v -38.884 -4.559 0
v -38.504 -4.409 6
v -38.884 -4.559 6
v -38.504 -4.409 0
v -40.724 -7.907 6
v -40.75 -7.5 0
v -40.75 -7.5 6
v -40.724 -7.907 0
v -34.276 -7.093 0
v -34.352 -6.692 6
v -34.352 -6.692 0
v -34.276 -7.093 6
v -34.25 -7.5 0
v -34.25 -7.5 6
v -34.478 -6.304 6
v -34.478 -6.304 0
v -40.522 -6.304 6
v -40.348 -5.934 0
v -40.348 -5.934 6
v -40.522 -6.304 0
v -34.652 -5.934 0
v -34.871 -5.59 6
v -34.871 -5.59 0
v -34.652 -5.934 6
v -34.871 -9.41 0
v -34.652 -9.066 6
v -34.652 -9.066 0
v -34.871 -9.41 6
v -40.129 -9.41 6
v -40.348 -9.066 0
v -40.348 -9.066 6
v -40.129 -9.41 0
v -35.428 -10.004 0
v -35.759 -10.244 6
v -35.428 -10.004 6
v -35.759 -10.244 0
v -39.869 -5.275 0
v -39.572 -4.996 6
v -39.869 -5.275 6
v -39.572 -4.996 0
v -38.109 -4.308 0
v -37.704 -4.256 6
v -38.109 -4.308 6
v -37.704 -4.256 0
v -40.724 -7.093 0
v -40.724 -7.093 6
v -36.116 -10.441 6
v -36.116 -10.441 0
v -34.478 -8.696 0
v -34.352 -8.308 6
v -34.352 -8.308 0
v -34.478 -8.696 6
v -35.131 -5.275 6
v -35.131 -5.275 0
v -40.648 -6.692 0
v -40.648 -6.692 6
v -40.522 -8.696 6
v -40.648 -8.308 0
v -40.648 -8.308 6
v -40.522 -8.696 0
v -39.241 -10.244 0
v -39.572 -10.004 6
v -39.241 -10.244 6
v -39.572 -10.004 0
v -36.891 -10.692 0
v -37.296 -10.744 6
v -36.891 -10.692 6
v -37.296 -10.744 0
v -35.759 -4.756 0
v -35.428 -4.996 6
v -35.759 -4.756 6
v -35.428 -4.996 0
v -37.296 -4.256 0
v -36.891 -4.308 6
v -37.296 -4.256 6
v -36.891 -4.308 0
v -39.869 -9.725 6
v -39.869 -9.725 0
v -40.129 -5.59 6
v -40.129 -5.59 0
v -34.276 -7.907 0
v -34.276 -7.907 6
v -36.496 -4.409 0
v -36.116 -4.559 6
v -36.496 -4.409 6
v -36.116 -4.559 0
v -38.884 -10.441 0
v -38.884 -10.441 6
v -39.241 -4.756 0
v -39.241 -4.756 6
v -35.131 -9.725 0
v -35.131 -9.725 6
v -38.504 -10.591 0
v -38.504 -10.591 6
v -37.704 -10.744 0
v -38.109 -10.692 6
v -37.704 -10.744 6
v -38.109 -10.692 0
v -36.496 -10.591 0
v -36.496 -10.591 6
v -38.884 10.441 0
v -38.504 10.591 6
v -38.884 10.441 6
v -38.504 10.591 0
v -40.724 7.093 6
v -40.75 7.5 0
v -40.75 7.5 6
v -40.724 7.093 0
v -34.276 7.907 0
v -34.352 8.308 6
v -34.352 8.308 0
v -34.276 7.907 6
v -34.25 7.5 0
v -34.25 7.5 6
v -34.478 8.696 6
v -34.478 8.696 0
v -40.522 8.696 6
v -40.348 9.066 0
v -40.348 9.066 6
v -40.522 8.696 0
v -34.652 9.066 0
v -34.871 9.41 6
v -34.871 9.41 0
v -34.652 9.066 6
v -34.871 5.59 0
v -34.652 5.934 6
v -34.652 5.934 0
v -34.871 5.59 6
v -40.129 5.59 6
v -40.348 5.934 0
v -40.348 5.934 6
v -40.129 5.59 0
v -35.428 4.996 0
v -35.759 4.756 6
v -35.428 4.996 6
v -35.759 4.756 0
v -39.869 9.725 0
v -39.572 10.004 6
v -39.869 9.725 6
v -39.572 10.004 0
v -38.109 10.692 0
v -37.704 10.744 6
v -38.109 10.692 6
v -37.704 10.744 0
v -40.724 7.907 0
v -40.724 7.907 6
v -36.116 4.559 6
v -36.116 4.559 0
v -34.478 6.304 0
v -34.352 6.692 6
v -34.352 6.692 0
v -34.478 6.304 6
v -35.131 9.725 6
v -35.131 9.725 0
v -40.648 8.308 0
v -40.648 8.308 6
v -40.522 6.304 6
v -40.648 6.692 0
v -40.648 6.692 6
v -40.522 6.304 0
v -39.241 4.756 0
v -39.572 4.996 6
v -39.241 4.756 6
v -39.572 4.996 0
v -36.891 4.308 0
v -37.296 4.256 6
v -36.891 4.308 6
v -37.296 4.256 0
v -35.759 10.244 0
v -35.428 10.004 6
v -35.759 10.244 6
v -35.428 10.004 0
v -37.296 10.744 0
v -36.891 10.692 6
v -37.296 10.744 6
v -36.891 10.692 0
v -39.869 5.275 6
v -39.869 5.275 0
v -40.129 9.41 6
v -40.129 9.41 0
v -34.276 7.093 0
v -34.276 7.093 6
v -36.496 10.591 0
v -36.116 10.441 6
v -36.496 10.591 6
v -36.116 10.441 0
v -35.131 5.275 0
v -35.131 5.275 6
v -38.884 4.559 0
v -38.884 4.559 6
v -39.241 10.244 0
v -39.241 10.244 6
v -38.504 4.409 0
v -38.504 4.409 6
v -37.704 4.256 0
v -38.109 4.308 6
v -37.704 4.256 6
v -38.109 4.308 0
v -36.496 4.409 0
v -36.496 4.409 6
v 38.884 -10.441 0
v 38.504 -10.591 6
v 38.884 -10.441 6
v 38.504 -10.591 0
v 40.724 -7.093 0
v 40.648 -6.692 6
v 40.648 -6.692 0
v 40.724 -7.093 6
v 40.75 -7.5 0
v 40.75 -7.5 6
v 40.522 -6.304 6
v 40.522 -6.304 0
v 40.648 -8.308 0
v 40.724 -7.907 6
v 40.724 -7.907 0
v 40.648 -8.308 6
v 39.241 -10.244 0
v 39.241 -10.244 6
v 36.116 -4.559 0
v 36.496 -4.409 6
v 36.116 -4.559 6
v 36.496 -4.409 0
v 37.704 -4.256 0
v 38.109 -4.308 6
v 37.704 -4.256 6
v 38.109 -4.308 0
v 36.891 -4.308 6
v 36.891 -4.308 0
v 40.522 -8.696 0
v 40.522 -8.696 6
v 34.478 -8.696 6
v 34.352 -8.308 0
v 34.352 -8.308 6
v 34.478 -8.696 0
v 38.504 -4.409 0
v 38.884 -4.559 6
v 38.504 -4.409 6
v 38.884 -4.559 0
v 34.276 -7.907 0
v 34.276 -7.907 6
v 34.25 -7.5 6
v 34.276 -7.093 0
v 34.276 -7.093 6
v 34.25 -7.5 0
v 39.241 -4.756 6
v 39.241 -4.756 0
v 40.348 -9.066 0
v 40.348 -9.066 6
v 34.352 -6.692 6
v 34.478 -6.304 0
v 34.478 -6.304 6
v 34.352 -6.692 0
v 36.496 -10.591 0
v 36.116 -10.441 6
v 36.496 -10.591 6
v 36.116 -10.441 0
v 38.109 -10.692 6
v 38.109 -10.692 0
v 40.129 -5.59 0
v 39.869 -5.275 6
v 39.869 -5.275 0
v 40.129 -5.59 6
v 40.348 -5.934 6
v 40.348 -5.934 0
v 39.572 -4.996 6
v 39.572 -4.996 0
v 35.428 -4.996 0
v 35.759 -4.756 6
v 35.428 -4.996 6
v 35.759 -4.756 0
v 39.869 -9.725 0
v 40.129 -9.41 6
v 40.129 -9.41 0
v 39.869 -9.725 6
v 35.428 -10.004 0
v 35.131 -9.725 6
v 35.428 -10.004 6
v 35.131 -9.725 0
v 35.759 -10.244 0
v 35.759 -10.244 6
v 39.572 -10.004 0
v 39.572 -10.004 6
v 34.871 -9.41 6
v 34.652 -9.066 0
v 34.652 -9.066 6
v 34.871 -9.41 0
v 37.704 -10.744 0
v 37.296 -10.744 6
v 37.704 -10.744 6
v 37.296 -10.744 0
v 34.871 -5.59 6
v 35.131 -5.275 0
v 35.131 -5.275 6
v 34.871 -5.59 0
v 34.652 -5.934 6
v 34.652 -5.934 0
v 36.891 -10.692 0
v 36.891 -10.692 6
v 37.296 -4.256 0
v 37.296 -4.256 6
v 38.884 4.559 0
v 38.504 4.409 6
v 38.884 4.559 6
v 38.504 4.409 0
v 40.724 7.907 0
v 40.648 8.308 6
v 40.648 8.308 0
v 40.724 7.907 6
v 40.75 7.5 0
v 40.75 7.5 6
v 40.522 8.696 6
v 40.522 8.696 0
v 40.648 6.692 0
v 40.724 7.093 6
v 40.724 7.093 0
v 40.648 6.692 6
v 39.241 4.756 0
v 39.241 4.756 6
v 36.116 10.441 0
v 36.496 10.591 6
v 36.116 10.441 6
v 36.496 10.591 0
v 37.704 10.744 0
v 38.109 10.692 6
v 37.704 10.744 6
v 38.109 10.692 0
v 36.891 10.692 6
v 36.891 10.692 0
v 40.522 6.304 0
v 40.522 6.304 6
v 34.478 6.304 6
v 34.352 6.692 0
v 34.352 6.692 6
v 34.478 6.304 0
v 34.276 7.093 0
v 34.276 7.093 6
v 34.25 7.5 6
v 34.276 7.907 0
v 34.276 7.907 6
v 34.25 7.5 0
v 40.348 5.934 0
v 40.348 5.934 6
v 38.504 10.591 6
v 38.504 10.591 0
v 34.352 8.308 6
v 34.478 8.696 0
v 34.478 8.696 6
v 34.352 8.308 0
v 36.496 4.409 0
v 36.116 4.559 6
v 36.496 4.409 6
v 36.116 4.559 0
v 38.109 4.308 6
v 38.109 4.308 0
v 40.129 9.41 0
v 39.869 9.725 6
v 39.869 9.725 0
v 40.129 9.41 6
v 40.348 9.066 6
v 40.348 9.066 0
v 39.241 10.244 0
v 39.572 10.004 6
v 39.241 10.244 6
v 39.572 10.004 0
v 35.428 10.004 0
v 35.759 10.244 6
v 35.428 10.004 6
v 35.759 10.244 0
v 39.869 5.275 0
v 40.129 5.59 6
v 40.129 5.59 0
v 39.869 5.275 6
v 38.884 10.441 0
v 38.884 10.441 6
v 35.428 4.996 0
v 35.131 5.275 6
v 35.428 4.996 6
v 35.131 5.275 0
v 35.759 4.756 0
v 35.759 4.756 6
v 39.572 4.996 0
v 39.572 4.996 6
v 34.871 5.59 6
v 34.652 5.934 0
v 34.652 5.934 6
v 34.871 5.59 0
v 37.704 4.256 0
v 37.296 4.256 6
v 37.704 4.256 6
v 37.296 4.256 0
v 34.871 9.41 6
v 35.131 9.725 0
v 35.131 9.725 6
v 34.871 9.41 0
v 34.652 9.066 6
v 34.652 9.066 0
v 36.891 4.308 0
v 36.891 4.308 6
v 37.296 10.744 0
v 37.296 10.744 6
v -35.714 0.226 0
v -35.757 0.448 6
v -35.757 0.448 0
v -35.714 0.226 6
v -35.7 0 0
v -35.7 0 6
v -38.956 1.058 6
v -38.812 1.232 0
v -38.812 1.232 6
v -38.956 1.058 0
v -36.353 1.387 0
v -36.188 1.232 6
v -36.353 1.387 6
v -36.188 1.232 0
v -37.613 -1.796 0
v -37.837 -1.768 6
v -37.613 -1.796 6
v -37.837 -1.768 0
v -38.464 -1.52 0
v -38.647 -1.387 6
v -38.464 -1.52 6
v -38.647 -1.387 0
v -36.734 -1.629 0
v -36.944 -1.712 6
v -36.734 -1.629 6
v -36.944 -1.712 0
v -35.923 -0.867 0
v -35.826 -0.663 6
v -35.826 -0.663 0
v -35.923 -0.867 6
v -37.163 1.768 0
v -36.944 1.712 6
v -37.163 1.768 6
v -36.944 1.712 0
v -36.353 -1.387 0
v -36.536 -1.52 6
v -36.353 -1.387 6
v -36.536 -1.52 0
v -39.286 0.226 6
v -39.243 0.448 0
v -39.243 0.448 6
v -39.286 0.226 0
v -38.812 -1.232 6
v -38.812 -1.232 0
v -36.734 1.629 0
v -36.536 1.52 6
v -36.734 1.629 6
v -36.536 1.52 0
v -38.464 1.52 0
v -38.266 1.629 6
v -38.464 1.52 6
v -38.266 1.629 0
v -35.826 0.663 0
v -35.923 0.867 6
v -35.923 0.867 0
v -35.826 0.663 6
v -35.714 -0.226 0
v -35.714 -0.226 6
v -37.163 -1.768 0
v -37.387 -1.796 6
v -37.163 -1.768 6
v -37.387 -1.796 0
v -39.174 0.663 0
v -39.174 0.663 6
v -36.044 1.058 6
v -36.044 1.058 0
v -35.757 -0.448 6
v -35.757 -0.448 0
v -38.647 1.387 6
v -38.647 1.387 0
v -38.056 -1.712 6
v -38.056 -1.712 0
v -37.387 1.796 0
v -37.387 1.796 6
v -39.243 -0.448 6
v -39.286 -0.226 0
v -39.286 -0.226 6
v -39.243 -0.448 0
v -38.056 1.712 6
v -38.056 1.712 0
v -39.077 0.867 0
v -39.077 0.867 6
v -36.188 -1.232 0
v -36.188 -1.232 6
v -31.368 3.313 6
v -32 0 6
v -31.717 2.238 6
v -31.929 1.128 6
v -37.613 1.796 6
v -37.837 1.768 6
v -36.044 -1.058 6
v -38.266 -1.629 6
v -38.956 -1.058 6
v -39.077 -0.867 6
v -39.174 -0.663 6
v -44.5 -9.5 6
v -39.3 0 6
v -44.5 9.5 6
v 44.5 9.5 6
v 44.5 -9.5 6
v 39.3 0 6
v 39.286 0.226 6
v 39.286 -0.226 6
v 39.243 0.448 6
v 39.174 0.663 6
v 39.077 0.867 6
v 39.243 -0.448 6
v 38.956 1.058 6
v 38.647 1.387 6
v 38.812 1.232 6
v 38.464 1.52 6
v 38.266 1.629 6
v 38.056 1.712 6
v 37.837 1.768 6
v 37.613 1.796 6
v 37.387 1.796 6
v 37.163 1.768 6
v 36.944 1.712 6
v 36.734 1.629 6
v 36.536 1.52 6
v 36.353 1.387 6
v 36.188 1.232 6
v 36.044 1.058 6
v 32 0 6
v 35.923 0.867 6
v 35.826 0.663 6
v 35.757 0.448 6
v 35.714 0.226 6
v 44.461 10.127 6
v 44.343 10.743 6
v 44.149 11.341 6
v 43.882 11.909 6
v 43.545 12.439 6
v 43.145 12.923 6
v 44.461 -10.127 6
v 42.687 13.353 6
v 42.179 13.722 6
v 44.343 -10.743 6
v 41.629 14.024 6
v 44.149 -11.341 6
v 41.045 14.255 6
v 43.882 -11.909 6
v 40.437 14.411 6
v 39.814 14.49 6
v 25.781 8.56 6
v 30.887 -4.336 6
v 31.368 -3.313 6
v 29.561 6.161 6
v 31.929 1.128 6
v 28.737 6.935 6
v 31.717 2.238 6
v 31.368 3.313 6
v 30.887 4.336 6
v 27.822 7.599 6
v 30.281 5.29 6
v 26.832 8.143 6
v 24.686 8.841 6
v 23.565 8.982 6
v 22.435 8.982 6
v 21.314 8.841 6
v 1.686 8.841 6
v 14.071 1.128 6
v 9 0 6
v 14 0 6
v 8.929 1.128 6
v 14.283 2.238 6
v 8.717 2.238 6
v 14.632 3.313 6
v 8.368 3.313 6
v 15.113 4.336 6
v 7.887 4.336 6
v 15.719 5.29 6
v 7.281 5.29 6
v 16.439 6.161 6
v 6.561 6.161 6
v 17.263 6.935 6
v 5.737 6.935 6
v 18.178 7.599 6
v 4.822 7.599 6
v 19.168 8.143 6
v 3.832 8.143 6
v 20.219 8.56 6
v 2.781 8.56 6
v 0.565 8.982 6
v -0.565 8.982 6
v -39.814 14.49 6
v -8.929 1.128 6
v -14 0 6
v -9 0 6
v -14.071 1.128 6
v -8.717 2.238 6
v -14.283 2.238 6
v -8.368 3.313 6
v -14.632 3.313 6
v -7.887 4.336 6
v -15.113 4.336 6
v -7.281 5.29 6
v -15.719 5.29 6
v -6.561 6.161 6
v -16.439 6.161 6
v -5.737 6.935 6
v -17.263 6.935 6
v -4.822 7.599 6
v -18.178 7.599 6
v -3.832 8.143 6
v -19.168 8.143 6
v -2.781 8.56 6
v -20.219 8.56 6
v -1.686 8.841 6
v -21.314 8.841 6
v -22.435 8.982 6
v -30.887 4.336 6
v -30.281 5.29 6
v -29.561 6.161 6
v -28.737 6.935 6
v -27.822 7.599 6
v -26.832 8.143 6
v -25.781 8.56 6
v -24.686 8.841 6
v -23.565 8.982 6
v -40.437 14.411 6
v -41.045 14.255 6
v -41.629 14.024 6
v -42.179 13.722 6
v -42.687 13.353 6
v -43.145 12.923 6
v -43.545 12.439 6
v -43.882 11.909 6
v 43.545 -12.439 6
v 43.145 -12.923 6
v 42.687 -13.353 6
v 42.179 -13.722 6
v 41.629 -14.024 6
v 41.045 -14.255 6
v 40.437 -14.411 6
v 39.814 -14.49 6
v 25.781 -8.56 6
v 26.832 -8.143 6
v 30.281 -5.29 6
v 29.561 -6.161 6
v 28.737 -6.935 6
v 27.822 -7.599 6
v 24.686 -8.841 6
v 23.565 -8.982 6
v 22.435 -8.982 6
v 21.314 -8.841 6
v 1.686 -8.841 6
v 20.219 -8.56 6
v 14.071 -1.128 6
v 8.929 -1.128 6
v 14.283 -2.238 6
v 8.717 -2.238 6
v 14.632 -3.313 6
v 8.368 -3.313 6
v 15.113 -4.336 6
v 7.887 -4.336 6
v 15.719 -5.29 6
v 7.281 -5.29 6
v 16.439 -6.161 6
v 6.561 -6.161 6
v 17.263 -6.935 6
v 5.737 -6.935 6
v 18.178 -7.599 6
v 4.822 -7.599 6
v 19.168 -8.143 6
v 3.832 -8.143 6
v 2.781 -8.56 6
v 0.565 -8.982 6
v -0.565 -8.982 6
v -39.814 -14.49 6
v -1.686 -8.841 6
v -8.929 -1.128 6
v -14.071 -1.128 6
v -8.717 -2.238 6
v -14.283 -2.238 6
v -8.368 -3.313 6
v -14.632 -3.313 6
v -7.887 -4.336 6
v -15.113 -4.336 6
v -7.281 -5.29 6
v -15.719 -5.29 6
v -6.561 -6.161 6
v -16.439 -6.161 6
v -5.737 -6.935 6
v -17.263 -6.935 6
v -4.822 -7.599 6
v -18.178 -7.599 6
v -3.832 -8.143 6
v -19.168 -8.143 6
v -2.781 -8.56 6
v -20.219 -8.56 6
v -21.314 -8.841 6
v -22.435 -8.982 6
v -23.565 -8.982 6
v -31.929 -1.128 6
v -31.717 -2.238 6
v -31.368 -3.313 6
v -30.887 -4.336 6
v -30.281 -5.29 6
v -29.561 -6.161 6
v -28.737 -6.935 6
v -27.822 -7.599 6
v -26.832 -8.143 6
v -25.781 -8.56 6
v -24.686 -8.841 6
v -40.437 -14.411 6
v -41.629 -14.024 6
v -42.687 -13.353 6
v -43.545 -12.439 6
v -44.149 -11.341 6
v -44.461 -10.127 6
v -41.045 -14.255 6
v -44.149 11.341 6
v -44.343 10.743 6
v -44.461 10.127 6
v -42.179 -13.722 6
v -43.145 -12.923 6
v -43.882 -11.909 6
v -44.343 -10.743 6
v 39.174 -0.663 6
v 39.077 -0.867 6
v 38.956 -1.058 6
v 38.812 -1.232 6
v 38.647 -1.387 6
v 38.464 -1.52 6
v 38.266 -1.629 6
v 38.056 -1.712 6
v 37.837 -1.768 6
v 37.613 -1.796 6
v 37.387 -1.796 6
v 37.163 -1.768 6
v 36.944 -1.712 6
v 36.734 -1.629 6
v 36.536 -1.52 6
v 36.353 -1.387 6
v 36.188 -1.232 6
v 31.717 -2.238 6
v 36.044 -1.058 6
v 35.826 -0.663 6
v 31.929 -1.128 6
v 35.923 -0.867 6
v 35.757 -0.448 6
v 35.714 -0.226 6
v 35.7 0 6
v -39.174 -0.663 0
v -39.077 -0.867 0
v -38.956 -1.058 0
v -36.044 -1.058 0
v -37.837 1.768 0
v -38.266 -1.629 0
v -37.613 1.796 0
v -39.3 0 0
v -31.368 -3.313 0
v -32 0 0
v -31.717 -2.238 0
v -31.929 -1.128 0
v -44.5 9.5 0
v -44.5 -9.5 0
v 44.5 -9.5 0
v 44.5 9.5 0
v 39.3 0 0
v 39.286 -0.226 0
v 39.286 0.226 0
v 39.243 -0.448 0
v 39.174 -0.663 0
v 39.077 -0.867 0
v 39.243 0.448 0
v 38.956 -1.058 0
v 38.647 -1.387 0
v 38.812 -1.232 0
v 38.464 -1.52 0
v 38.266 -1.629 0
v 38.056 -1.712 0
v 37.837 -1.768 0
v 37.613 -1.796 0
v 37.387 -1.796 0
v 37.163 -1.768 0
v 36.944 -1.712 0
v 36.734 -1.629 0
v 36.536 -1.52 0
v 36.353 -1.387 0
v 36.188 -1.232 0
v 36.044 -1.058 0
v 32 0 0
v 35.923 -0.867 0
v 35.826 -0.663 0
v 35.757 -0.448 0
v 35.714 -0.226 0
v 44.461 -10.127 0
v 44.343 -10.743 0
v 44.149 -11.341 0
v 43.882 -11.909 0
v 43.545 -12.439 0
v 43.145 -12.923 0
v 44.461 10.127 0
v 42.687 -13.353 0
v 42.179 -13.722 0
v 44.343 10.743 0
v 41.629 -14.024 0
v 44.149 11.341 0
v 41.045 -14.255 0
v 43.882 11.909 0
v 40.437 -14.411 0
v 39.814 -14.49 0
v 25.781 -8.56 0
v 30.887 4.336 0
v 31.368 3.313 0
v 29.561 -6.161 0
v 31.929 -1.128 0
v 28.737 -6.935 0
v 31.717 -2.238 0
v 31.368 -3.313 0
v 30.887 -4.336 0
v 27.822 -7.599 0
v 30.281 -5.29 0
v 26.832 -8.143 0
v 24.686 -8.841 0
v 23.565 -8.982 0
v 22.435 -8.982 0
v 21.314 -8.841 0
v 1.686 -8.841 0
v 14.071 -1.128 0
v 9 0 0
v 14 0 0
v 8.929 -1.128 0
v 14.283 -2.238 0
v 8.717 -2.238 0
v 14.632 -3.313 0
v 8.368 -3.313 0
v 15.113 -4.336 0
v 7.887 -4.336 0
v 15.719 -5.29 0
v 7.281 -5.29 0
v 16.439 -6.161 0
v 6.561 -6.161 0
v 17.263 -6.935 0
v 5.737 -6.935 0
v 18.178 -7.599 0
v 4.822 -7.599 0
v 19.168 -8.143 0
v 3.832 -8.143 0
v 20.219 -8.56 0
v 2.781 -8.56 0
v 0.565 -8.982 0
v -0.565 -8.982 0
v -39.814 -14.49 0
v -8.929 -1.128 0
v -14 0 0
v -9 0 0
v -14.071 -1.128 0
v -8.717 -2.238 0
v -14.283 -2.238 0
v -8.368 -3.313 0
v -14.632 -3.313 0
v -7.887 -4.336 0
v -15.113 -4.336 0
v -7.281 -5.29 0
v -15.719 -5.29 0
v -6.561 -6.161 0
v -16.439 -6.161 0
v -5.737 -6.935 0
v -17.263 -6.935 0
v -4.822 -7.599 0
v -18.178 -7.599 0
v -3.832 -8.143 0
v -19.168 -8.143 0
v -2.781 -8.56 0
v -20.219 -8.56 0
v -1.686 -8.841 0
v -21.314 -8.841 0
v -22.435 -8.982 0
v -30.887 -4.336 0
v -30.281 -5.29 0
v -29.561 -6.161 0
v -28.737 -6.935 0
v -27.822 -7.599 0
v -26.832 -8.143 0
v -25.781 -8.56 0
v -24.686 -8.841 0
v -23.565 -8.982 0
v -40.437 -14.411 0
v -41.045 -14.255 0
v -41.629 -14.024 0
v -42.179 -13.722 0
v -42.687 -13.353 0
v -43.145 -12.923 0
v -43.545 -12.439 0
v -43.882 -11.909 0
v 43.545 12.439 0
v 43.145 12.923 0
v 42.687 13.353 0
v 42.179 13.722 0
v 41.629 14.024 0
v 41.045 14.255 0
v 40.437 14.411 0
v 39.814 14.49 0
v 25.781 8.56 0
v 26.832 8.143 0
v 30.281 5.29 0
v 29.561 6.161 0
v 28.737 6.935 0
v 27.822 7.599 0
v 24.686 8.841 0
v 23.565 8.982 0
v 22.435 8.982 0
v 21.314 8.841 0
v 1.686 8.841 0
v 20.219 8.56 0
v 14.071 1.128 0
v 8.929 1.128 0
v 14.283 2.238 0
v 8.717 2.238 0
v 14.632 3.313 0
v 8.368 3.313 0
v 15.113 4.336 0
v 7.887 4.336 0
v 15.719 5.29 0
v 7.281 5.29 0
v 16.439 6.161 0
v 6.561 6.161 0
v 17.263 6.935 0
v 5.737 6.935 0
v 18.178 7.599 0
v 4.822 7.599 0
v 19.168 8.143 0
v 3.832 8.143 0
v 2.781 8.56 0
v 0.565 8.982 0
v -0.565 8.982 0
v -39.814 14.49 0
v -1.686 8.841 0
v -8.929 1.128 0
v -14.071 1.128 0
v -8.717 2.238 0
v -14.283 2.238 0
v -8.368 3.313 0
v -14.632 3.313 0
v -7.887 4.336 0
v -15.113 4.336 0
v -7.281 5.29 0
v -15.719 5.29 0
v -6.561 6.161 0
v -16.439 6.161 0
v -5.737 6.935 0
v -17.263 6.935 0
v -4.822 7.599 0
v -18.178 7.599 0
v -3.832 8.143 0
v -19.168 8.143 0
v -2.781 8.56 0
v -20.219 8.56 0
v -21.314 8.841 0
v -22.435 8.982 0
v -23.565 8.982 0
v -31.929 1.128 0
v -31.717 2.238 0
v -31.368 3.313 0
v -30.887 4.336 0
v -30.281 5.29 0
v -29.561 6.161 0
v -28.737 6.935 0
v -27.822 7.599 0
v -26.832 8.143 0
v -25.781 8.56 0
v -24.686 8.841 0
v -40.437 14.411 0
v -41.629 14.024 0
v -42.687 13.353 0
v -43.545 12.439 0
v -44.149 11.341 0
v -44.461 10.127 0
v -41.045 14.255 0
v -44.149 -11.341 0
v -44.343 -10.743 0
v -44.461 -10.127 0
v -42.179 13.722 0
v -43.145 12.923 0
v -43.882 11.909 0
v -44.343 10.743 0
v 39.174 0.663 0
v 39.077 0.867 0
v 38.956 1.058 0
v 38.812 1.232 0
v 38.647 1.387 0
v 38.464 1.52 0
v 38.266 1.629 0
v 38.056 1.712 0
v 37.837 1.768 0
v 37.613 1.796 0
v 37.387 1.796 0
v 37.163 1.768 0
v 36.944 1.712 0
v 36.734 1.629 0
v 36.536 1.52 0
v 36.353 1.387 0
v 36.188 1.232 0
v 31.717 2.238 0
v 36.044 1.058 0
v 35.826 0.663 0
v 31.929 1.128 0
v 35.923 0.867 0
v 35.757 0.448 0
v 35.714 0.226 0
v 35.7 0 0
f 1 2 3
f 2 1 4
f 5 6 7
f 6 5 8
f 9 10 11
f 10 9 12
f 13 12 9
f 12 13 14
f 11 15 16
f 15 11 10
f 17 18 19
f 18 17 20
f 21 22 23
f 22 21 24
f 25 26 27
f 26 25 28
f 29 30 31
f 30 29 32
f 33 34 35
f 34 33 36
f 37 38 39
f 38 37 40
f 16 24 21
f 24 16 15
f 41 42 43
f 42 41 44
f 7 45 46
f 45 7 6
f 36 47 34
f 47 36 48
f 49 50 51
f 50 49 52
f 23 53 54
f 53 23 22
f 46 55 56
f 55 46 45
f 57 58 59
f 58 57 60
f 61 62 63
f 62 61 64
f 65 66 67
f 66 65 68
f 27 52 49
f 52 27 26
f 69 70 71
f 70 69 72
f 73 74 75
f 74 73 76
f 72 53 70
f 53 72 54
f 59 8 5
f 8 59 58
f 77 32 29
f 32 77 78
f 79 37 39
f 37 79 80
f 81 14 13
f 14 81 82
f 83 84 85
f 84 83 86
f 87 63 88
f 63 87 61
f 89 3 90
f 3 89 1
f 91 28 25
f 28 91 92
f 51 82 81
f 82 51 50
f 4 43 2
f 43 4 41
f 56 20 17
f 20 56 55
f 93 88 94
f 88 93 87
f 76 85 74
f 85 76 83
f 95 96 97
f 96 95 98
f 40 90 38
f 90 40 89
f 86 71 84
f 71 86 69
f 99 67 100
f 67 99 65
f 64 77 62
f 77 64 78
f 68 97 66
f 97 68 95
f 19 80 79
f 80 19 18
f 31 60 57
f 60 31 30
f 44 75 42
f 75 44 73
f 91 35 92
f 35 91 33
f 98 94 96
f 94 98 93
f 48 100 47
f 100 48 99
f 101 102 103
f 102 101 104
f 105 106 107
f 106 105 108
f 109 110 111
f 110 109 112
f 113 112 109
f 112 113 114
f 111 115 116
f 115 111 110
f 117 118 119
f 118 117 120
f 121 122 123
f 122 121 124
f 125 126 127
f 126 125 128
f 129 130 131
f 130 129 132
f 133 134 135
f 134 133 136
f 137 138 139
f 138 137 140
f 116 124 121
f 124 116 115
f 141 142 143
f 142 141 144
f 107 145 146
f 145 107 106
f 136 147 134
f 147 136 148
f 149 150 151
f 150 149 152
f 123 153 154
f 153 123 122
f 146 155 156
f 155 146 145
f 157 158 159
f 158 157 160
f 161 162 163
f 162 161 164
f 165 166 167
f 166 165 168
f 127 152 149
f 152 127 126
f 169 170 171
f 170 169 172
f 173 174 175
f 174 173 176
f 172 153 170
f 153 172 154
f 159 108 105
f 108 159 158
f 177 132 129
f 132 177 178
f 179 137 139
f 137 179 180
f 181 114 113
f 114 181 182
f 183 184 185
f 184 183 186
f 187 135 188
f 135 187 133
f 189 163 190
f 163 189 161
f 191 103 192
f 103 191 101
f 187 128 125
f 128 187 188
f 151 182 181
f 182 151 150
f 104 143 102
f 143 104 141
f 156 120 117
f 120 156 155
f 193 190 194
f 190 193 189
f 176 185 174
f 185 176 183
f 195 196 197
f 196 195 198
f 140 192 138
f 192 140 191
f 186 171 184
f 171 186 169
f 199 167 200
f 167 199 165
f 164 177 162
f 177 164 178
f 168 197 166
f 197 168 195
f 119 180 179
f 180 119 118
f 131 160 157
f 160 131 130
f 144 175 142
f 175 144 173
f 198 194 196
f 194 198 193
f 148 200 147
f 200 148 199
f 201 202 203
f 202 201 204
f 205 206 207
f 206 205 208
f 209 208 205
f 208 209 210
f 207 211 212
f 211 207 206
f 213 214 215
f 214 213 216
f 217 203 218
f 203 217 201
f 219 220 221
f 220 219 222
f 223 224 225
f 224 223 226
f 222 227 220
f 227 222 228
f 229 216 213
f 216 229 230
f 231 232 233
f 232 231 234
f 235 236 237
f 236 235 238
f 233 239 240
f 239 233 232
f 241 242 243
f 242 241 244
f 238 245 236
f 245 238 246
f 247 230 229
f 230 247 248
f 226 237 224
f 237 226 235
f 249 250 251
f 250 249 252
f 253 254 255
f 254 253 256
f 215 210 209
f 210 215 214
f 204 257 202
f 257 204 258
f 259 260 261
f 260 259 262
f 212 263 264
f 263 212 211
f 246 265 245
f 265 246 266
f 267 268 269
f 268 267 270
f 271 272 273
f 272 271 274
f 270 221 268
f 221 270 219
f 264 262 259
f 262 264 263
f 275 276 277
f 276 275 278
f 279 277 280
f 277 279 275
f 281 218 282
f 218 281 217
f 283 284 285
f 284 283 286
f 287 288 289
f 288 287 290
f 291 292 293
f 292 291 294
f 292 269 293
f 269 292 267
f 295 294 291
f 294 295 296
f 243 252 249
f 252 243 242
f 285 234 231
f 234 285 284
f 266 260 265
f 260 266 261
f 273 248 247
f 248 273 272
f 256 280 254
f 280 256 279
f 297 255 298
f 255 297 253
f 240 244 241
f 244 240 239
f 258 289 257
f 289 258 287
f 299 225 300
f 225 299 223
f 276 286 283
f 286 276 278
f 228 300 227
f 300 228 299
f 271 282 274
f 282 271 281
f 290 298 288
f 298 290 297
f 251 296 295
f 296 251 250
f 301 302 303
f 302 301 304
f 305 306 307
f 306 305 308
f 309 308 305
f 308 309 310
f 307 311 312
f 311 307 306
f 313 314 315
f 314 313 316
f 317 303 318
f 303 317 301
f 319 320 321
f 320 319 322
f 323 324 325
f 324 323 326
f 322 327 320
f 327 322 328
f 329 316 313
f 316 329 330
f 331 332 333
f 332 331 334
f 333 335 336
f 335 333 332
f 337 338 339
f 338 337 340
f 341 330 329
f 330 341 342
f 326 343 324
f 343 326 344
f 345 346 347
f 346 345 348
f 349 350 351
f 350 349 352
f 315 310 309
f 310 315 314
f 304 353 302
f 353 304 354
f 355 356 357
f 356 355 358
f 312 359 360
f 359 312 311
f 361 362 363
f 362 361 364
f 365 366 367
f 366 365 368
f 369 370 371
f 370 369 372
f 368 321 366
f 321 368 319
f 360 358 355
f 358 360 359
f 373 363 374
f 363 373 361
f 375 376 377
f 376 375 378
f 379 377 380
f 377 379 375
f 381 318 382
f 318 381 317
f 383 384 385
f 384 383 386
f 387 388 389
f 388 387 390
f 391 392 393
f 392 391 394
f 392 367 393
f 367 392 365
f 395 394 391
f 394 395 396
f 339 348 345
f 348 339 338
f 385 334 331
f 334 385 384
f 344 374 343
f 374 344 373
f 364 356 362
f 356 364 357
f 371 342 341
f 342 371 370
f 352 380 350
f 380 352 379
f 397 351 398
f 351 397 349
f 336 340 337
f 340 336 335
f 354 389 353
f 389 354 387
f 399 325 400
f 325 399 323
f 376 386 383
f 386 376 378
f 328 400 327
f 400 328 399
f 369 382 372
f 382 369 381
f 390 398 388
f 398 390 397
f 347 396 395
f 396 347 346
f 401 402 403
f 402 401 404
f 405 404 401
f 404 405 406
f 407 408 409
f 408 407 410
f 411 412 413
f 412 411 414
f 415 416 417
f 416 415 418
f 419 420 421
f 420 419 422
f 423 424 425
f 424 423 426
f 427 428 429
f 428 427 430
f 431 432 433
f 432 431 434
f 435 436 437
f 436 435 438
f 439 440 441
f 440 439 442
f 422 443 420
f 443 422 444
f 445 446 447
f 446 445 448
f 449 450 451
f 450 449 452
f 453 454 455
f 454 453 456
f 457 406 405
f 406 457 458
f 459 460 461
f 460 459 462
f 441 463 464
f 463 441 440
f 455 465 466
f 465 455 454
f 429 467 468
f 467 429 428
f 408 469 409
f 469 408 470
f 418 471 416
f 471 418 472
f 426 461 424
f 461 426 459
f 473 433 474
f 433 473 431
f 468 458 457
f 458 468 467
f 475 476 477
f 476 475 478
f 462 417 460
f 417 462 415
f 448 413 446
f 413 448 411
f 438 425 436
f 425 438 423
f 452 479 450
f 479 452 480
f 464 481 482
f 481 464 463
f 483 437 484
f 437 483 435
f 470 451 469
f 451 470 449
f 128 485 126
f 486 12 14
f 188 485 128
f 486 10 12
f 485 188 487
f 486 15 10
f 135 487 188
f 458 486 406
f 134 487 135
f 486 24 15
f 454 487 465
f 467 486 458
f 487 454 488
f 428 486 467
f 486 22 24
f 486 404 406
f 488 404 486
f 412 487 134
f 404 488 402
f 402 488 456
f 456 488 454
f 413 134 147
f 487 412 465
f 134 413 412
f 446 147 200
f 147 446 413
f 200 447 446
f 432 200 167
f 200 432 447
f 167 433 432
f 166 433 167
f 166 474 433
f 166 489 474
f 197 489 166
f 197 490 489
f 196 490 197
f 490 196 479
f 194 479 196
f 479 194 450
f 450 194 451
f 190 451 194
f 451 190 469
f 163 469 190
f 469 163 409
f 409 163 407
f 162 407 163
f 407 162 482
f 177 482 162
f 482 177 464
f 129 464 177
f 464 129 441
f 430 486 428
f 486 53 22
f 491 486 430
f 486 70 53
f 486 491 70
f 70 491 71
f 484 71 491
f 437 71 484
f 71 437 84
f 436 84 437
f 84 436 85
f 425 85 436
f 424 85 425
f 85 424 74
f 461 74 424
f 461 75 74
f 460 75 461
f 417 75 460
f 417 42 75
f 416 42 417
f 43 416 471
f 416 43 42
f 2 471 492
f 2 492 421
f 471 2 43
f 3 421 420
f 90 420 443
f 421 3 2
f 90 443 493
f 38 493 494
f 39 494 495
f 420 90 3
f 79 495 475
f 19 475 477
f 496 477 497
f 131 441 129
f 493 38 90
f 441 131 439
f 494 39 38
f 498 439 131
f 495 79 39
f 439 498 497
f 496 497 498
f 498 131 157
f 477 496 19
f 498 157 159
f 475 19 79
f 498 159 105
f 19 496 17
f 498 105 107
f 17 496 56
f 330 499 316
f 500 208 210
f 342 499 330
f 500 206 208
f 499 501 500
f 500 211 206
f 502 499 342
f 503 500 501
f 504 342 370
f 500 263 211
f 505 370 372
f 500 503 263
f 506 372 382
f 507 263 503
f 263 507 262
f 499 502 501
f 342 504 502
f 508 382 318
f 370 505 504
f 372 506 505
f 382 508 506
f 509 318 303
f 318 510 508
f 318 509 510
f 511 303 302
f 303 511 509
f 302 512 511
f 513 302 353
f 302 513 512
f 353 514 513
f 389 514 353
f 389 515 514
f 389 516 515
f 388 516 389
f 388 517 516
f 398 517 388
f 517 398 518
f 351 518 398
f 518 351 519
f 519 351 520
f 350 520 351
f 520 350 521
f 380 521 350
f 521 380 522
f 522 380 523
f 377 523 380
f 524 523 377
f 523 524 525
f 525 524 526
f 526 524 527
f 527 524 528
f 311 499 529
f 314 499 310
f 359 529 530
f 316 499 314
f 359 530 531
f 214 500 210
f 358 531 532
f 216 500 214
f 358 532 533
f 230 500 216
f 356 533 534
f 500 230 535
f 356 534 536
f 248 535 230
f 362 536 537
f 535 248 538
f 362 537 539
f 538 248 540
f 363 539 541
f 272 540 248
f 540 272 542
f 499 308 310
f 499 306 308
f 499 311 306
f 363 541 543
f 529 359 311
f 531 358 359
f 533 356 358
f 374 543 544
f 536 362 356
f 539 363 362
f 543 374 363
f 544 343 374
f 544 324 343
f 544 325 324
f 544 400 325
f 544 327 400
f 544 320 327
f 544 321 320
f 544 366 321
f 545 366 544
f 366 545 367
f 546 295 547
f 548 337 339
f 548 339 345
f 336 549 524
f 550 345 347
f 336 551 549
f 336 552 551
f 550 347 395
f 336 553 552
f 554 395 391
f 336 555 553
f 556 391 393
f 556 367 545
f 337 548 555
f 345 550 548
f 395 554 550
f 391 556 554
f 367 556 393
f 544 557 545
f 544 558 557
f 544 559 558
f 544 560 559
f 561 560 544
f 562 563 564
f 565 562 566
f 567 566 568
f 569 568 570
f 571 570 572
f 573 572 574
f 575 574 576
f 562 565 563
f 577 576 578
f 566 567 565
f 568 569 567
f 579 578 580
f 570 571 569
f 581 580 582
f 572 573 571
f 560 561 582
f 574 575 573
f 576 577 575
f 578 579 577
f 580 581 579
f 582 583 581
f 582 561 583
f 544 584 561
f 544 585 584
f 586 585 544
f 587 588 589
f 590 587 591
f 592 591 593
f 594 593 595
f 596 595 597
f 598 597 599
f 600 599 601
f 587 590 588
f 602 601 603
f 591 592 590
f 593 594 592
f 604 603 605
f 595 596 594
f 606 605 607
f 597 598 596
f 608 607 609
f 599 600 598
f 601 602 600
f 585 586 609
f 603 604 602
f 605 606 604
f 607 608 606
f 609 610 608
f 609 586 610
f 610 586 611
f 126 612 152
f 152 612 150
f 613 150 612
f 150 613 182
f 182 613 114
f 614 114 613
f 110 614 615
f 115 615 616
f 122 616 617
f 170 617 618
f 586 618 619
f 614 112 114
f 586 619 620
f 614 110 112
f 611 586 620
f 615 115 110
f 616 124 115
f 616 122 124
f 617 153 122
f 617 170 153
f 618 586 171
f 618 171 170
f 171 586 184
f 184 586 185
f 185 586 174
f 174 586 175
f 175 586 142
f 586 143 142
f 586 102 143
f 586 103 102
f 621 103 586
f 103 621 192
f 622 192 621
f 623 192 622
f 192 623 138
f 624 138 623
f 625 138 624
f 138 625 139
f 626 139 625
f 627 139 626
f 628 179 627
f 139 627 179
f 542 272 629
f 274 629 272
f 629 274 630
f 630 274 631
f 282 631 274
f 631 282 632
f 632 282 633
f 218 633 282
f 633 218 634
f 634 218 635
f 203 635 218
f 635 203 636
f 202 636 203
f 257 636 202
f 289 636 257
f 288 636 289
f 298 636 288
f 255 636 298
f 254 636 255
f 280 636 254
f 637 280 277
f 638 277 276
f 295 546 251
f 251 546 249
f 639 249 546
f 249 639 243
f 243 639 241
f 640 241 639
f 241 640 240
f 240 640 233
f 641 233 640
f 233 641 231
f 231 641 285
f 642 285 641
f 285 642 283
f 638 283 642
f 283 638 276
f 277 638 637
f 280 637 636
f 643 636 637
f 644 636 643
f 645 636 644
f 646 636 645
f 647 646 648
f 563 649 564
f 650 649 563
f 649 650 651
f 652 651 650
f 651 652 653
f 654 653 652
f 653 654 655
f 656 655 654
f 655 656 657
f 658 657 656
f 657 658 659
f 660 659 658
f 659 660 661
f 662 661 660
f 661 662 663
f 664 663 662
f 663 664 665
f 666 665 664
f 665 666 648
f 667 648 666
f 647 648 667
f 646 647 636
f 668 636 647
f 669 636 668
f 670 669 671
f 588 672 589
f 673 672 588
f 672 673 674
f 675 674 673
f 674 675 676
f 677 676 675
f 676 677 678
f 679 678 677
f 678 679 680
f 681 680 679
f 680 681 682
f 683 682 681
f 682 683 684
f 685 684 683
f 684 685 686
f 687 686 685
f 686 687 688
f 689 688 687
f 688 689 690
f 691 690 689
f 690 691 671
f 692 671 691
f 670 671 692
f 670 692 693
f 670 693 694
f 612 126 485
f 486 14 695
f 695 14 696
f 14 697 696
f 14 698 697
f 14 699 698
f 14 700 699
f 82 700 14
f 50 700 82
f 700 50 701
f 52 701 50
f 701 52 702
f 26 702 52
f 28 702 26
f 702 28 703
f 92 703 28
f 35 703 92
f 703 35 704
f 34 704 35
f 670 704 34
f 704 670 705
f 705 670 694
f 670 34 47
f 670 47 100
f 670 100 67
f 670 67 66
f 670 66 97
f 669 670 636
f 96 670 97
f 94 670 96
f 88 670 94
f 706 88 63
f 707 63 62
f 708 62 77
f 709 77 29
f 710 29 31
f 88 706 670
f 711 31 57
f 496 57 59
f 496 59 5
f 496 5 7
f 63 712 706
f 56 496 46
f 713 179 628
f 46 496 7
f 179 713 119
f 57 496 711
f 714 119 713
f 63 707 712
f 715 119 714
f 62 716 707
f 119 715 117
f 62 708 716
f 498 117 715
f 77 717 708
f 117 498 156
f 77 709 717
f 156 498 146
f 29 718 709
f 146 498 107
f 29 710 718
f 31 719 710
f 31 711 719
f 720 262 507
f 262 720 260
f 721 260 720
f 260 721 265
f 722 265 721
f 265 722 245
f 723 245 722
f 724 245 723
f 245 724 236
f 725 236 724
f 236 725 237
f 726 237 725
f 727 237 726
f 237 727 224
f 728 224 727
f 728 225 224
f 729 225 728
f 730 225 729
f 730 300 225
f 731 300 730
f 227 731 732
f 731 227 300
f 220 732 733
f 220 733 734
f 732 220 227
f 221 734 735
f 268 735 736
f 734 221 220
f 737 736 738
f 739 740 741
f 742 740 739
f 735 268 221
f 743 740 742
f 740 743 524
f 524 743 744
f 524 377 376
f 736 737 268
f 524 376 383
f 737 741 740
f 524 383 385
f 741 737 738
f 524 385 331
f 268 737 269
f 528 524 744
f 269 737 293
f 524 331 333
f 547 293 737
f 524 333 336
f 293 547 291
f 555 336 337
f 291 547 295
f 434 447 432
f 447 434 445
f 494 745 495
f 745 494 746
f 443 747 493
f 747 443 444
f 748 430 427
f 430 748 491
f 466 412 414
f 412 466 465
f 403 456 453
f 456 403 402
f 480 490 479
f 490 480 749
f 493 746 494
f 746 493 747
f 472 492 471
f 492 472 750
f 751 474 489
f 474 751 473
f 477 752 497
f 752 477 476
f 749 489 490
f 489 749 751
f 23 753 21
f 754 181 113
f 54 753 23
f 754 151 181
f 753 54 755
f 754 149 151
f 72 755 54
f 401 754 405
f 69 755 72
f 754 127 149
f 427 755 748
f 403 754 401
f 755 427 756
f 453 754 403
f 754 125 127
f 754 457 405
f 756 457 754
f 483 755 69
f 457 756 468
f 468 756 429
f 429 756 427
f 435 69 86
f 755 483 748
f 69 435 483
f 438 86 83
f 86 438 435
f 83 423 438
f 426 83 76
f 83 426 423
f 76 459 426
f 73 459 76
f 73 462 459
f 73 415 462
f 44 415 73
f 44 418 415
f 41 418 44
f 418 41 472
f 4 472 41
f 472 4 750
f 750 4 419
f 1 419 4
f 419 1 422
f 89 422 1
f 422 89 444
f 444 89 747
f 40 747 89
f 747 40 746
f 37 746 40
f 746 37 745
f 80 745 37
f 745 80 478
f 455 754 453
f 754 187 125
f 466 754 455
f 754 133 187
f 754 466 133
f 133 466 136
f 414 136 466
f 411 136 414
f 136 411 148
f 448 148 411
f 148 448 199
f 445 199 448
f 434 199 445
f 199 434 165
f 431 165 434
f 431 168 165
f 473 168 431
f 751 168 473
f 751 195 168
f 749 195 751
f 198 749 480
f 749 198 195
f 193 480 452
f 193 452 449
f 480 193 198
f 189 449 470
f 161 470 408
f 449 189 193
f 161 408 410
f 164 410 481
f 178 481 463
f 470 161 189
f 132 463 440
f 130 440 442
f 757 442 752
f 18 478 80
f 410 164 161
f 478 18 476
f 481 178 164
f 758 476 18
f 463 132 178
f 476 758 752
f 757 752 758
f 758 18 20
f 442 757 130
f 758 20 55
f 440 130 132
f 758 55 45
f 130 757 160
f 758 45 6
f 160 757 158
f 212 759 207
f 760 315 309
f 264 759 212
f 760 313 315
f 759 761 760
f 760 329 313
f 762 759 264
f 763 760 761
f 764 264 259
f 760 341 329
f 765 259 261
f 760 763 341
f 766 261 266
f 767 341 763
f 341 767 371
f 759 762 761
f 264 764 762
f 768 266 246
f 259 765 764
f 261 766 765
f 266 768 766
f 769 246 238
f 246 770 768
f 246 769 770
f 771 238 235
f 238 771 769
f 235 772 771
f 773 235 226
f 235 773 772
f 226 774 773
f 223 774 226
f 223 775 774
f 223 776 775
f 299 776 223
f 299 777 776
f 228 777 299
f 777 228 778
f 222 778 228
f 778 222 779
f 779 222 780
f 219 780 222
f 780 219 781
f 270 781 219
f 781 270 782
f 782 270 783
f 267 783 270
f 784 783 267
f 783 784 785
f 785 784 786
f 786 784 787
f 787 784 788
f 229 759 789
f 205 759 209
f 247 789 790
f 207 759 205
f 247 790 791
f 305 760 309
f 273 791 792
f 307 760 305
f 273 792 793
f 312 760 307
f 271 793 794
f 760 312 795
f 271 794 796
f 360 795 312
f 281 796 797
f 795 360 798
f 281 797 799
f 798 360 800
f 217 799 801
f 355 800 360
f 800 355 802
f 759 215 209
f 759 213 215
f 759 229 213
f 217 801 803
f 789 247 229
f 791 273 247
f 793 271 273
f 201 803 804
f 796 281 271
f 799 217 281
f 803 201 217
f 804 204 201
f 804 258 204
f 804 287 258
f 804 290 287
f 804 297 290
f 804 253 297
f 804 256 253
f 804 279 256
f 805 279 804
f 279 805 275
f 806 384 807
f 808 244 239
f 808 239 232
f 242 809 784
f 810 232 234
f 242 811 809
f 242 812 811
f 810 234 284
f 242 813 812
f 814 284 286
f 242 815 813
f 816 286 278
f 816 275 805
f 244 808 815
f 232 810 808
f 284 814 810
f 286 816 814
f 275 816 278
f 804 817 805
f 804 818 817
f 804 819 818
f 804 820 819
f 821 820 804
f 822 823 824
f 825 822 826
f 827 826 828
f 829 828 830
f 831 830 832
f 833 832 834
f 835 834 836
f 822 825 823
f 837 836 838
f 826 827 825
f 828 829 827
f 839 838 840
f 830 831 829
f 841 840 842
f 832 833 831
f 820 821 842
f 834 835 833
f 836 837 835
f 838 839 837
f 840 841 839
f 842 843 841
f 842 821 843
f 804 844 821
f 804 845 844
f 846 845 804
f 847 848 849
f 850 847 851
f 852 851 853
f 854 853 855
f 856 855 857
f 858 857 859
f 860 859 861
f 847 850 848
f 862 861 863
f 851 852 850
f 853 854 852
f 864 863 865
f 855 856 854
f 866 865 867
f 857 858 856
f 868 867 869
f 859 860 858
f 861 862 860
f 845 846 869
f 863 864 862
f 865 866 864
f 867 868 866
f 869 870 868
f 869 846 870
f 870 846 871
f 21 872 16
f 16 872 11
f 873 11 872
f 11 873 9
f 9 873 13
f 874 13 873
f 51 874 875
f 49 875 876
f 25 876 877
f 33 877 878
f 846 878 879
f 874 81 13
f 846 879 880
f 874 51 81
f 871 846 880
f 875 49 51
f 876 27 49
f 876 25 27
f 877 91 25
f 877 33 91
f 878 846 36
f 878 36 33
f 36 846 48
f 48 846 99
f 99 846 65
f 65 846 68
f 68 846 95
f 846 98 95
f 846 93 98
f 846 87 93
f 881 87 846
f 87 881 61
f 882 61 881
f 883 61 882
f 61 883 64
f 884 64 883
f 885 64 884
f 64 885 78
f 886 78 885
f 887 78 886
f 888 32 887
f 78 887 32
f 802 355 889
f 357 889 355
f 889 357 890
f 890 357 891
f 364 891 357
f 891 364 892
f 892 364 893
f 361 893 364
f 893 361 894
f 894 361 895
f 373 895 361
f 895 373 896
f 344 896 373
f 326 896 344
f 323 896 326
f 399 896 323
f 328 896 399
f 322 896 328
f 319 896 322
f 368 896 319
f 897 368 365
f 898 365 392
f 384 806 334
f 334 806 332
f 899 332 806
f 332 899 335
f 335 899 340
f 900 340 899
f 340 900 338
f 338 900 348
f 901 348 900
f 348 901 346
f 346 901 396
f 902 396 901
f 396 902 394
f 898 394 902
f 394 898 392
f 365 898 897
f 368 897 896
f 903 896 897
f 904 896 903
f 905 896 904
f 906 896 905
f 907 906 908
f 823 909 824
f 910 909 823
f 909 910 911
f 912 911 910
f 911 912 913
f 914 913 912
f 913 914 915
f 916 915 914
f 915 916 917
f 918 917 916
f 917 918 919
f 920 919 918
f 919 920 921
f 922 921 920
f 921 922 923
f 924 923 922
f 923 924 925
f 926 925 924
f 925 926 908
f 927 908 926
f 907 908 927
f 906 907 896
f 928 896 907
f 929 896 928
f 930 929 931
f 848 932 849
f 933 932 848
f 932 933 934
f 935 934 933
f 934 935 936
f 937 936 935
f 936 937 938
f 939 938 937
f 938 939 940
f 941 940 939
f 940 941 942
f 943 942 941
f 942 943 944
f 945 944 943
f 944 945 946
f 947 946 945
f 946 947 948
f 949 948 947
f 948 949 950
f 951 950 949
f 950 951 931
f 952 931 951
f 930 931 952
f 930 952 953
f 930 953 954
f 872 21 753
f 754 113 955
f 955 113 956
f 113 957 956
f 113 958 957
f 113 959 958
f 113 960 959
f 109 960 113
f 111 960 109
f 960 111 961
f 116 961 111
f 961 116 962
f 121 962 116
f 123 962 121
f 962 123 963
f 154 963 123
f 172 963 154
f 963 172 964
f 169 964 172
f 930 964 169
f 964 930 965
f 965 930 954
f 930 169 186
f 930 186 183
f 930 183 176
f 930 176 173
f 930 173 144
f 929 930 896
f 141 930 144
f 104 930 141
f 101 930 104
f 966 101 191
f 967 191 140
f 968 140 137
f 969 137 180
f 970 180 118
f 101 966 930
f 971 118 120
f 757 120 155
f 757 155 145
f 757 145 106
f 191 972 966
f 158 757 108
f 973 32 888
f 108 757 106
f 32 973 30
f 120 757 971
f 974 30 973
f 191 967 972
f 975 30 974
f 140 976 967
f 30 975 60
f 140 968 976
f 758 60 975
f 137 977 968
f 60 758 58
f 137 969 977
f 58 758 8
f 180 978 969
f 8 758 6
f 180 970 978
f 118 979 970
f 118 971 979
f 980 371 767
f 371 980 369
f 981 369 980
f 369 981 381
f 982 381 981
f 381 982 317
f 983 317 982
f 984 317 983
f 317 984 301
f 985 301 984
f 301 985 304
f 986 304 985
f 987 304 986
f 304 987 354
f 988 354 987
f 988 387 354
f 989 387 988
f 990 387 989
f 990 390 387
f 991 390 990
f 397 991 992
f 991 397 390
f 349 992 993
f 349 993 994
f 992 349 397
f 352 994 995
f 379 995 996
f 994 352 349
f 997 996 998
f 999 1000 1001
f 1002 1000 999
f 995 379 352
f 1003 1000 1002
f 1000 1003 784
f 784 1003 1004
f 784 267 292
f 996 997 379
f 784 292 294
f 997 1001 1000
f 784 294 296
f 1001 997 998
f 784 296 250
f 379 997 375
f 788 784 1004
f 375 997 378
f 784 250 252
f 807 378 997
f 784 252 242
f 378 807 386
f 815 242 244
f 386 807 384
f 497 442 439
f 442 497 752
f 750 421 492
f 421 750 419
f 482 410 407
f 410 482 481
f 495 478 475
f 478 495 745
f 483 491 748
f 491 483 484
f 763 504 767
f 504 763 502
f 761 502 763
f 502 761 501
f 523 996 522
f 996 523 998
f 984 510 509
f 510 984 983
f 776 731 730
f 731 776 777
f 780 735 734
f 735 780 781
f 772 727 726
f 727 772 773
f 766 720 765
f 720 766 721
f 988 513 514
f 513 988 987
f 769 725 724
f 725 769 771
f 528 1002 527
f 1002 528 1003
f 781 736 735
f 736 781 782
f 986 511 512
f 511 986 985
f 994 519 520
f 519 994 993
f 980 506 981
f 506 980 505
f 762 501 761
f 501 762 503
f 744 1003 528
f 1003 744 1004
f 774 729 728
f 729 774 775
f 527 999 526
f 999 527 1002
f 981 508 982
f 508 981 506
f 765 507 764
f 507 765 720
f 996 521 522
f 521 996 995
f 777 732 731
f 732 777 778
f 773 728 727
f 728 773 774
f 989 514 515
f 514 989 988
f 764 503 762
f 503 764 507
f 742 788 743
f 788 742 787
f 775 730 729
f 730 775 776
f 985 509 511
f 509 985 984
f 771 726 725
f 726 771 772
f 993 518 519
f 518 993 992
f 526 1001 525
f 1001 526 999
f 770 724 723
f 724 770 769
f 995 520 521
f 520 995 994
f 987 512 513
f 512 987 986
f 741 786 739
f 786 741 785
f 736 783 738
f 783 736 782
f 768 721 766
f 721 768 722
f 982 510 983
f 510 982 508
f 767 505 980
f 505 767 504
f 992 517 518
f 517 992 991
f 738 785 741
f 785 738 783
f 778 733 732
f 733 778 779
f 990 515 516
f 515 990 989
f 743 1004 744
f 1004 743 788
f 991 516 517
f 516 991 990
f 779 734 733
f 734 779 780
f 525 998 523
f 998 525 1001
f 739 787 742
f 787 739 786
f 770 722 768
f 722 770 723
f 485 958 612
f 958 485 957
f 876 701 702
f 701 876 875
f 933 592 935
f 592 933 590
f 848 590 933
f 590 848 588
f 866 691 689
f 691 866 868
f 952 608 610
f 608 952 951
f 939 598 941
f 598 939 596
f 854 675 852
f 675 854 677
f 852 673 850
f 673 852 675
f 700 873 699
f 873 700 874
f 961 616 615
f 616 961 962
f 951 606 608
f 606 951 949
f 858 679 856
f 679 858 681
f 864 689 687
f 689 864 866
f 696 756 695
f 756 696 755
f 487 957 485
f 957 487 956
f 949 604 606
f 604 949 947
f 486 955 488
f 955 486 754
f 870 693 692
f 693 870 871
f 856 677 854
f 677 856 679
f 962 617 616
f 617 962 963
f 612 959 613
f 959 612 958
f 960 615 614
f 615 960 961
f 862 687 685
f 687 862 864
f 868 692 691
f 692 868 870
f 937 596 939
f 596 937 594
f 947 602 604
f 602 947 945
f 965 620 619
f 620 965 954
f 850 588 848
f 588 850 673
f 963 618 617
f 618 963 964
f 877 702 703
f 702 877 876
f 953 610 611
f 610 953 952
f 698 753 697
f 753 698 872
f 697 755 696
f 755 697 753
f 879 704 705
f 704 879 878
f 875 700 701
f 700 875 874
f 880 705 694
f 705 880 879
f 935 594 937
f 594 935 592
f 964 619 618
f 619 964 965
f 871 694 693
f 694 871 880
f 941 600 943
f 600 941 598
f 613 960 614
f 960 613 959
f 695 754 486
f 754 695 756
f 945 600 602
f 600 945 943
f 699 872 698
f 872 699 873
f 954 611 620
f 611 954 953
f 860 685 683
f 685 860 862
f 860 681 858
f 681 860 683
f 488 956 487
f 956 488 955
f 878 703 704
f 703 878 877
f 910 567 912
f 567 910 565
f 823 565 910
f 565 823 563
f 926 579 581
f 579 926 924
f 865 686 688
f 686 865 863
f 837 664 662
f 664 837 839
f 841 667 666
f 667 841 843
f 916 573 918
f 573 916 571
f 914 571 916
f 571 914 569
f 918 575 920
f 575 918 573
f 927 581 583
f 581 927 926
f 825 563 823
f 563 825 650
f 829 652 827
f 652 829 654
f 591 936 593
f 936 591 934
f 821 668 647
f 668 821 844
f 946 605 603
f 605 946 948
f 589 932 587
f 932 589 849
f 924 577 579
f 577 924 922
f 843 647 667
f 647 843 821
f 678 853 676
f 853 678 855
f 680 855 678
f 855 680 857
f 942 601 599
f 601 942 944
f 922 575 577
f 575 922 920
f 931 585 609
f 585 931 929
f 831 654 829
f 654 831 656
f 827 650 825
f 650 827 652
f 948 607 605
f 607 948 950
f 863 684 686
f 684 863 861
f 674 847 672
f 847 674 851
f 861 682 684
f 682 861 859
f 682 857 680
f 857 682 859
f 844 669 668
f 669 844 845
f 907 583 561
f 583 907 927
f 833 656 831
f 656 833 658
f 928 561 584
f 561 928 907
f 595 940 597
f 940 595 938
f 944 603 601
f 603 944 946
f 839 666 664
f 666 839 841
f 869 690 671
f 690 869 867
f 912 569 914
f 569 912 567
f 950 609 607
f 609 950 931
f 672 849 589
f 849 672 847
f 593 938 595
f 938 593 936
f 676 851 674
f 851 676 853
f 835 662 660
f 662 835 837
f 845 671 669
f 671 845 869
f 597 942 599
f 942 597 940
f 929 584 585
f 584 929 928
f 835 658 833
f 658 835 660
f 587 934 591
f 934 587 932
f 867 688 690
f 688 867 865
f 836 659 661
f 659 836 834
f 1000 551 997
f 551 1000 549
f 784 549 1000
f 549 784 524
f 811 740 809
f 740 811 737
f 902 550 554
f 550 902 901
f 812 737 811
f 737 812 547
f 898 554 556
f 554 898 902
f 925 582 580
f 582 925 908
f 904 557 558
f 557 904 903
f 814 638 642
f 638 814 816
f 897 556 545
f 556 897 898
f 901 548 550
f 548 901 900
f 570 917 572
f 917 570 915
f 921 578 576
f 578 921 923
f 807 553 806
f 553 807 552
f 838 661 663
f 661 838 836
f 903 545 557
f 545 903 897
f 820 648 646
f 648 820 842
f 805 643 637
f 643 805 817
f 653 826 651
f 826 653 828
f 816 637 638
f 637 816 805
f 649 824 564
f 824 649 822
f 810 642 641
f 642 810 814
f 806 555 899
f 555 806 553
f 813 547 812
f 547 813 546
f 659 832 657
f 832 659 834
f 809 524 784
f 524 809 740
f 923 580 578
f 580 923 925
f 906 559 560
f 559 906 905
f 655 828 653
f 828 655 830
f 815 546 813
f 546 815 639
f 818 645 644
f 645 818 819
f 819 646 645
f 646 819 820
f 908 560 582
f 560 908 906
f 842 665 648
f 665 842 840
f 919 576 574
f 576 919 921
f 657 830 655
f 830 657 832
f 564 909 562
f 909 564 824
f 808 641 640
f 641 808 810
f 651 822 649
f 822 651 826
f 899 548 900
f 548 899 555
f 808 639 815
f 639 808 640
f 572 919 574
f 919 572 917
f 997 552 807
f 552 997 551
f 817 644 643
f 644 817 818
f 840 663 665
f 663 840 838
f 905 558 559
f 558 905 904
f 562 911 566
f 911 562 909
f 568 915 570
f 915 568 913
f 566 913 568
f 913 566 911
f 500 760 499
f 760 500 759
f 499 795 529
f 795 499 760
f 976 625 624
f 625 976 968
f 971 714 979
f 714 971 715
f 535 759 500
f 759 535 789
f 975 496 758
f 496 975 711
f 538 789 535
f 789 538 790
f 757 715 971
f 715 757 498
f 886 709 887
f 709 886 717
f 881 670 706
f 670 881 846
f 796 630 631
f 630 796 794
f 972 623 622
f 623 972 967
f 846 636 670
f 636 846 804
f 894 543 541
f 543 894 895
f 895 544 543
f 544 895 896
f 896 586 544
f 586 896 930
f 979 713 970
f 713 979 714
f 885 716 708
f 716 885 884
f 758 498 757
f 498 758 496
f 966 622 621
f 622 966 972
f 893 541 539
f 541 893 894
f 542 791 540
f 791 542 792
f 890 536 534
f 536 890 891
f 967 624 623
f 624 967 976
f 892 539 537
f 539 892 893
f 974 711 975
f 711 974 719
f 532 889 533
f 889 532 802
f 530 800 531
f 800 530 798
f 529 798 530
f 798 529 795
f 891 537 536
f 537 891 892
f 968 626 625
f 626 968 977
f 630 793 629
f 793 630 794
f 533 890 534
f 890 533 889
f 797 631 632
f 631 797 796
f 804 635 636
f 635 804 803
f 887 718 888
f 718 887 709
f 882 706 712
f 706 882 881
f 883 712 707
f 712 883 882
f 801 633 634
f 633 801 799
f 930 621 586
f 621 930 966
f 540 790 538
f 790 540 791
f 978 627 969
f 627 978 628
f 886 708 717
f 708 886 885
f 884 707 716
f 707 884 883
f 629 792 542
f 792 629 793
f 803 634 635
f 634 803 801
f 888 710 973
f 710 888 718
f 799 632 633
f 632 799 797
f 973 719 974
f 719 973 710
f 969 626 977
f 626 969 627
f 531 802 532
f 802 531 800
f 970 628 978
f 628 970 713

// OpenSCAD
$fn = 50;


difference() {
	union() {
		hull() {
			translate(v = [-39.5000000000, 9.5000000000, 0]) {
				cylinder(h = 6, r = 5);
			}
			translate(v = [39.5000000000, 9.5000000000, 0]) {
				cylinder(h = 6, r = 5);
			}
			translate(v = [-39.5000000000, -9.5000000000, 0]) {
				cylinder(h = 6, r = 5);
			}
			translate(v = [39.5000000000, -9.5000000000, 0]) {
				cylinder(h = 6, r = 5);
			}
		}
	}
	union() {
		#translate(v = [-37.5000000000, -7.5000000000, 0]) {
			cylinder(h = 6, r = 3.2500000000);
		}
		#translate(v = [-37.5000000000, 7.5000000000, 0]) {
			cylinder(h = 6, r = 3.2500000000);
		}
		#translate(v = [37.5000000000, -7.5000000000, 0]) {
			cylinder(h = 6, r = 3.2500000000);
		}
		#translate(v = [37.5000000000, 7.5000000000, 0]) {
			cylinder(h = 6, r = 3.2500000000);
		}
		#translate(v = [-37.5000000000, -7.5000000000, -100.0000000000]) {
			cylinder(h = 200, r = 3.2500000000);
		}
		#translate(v = [-37.5000000000, 7.5000000000, -100.0000000000]) {
			cylinder(h = 200, r = 3.2500000000);
		}
		#translate(v = [37.5000000000, -7.5000000000, -100.0000000000]) {
			cylinder(h = 200, r = 3.2500000000);
		}
		#translate(v = [37.5000000000, 7.5000000000, -100.0000000000]) {
			cylinder(h = 200, r = 3.2500000000);
		}
		#translate(v = [-37.5000000000, -7.5000000000, 0]) {
			cylinder(h = 6, r = 1.8000000000);
		}
		#translate(v = [-37.5000000000, 0.0000000000, 0]) {
			cylinder(h = 6, r = 1.8000000000);
		}
		#translate(v = [-37.5000000000, 7.5000000000, 0]) {
			cylinder(h = 6, r = 1.8000000000);
		}
		#translate(v = [37.5000000000, -7.5000000000, 0]) {
			cylinder(h = 6, r = 1.8000000000);
		}
		#translate(v = [37.5000000000, 0.0000000000, 0]) {
			cylinder(h = 6, r = 1.8000000000);
		}
		#translate(v = [37.5000000000, 7.5000000000, 0]) {
			cylinder(h = 6, r = 1.8000000000);
		}
		#translate(v = [-37.5000000000, -7.5000000000, 0]) {
			cylinder(h = 6, r = 1.8000000000);
		}
		#translate(v = [-37.5000000000, 0.0000000000, 0]) {
			cylinder(h = 6, r = 1.8000000000);
		}
		#translate(v = [-37.5000000000, 7.5000000000, 0]) {
			cylinder(h = 6, r = 1.8000000000);
		}
		#translate(v = [37.5000000000, -7.5000000000, 0]) {
			cylinder(h = 6, r = 1.8000000000);
		}
		#translate(v = [37.5000000000, 0.0000000000, 0]) {
			cylinder(h = 6, r = 1.8000000000);
		}
		#translate(v = [37.5000000000, 7.5000000000, 0]) {
			cylinder(h = 6, r = 1.8000000000);
		}
		#translate(v = [-37.5000000000, -7.5000000000, 0]) {
			cylinder(h = 6, r = 1.8000000000);
		}
		#translate(v = [-37.5000000000, 0.0000000000, 0]) {
			cylinder(h = 6, r = 1.8000000000);
		}
		#translate(v = [-37.5000000000, 7.5000000000, 0]) {
			cylinder(h = 6, r = 1.8000000000);
		}
		#translate(v = [37.5000000000, -7.5000000000, 0]) {
			cylinder(h = 6, r = 1.8000000000);
		}
		#translate(v = [37.5000000000, 0.0000000000, 0]) {
			cylinder(h = 6, r = 1.8000000000);
		}
		#translate(v = [37.5000000000, 7.5000000000, 0]) {
			cylinder(h = 6, r = 1.8000000000);
		}
		#translate(v = [-23.0000000000, 0, 0]) {
			cylinder(h = 6, r = 9.0000000000);
		}
		#cylinder(h = 6, r = 9.0000000000);
		#translate(v = [23.0000000000, 0, 0]) {
			cylinder(h = 6, r = 9.0000000000);
		}
	}
}
